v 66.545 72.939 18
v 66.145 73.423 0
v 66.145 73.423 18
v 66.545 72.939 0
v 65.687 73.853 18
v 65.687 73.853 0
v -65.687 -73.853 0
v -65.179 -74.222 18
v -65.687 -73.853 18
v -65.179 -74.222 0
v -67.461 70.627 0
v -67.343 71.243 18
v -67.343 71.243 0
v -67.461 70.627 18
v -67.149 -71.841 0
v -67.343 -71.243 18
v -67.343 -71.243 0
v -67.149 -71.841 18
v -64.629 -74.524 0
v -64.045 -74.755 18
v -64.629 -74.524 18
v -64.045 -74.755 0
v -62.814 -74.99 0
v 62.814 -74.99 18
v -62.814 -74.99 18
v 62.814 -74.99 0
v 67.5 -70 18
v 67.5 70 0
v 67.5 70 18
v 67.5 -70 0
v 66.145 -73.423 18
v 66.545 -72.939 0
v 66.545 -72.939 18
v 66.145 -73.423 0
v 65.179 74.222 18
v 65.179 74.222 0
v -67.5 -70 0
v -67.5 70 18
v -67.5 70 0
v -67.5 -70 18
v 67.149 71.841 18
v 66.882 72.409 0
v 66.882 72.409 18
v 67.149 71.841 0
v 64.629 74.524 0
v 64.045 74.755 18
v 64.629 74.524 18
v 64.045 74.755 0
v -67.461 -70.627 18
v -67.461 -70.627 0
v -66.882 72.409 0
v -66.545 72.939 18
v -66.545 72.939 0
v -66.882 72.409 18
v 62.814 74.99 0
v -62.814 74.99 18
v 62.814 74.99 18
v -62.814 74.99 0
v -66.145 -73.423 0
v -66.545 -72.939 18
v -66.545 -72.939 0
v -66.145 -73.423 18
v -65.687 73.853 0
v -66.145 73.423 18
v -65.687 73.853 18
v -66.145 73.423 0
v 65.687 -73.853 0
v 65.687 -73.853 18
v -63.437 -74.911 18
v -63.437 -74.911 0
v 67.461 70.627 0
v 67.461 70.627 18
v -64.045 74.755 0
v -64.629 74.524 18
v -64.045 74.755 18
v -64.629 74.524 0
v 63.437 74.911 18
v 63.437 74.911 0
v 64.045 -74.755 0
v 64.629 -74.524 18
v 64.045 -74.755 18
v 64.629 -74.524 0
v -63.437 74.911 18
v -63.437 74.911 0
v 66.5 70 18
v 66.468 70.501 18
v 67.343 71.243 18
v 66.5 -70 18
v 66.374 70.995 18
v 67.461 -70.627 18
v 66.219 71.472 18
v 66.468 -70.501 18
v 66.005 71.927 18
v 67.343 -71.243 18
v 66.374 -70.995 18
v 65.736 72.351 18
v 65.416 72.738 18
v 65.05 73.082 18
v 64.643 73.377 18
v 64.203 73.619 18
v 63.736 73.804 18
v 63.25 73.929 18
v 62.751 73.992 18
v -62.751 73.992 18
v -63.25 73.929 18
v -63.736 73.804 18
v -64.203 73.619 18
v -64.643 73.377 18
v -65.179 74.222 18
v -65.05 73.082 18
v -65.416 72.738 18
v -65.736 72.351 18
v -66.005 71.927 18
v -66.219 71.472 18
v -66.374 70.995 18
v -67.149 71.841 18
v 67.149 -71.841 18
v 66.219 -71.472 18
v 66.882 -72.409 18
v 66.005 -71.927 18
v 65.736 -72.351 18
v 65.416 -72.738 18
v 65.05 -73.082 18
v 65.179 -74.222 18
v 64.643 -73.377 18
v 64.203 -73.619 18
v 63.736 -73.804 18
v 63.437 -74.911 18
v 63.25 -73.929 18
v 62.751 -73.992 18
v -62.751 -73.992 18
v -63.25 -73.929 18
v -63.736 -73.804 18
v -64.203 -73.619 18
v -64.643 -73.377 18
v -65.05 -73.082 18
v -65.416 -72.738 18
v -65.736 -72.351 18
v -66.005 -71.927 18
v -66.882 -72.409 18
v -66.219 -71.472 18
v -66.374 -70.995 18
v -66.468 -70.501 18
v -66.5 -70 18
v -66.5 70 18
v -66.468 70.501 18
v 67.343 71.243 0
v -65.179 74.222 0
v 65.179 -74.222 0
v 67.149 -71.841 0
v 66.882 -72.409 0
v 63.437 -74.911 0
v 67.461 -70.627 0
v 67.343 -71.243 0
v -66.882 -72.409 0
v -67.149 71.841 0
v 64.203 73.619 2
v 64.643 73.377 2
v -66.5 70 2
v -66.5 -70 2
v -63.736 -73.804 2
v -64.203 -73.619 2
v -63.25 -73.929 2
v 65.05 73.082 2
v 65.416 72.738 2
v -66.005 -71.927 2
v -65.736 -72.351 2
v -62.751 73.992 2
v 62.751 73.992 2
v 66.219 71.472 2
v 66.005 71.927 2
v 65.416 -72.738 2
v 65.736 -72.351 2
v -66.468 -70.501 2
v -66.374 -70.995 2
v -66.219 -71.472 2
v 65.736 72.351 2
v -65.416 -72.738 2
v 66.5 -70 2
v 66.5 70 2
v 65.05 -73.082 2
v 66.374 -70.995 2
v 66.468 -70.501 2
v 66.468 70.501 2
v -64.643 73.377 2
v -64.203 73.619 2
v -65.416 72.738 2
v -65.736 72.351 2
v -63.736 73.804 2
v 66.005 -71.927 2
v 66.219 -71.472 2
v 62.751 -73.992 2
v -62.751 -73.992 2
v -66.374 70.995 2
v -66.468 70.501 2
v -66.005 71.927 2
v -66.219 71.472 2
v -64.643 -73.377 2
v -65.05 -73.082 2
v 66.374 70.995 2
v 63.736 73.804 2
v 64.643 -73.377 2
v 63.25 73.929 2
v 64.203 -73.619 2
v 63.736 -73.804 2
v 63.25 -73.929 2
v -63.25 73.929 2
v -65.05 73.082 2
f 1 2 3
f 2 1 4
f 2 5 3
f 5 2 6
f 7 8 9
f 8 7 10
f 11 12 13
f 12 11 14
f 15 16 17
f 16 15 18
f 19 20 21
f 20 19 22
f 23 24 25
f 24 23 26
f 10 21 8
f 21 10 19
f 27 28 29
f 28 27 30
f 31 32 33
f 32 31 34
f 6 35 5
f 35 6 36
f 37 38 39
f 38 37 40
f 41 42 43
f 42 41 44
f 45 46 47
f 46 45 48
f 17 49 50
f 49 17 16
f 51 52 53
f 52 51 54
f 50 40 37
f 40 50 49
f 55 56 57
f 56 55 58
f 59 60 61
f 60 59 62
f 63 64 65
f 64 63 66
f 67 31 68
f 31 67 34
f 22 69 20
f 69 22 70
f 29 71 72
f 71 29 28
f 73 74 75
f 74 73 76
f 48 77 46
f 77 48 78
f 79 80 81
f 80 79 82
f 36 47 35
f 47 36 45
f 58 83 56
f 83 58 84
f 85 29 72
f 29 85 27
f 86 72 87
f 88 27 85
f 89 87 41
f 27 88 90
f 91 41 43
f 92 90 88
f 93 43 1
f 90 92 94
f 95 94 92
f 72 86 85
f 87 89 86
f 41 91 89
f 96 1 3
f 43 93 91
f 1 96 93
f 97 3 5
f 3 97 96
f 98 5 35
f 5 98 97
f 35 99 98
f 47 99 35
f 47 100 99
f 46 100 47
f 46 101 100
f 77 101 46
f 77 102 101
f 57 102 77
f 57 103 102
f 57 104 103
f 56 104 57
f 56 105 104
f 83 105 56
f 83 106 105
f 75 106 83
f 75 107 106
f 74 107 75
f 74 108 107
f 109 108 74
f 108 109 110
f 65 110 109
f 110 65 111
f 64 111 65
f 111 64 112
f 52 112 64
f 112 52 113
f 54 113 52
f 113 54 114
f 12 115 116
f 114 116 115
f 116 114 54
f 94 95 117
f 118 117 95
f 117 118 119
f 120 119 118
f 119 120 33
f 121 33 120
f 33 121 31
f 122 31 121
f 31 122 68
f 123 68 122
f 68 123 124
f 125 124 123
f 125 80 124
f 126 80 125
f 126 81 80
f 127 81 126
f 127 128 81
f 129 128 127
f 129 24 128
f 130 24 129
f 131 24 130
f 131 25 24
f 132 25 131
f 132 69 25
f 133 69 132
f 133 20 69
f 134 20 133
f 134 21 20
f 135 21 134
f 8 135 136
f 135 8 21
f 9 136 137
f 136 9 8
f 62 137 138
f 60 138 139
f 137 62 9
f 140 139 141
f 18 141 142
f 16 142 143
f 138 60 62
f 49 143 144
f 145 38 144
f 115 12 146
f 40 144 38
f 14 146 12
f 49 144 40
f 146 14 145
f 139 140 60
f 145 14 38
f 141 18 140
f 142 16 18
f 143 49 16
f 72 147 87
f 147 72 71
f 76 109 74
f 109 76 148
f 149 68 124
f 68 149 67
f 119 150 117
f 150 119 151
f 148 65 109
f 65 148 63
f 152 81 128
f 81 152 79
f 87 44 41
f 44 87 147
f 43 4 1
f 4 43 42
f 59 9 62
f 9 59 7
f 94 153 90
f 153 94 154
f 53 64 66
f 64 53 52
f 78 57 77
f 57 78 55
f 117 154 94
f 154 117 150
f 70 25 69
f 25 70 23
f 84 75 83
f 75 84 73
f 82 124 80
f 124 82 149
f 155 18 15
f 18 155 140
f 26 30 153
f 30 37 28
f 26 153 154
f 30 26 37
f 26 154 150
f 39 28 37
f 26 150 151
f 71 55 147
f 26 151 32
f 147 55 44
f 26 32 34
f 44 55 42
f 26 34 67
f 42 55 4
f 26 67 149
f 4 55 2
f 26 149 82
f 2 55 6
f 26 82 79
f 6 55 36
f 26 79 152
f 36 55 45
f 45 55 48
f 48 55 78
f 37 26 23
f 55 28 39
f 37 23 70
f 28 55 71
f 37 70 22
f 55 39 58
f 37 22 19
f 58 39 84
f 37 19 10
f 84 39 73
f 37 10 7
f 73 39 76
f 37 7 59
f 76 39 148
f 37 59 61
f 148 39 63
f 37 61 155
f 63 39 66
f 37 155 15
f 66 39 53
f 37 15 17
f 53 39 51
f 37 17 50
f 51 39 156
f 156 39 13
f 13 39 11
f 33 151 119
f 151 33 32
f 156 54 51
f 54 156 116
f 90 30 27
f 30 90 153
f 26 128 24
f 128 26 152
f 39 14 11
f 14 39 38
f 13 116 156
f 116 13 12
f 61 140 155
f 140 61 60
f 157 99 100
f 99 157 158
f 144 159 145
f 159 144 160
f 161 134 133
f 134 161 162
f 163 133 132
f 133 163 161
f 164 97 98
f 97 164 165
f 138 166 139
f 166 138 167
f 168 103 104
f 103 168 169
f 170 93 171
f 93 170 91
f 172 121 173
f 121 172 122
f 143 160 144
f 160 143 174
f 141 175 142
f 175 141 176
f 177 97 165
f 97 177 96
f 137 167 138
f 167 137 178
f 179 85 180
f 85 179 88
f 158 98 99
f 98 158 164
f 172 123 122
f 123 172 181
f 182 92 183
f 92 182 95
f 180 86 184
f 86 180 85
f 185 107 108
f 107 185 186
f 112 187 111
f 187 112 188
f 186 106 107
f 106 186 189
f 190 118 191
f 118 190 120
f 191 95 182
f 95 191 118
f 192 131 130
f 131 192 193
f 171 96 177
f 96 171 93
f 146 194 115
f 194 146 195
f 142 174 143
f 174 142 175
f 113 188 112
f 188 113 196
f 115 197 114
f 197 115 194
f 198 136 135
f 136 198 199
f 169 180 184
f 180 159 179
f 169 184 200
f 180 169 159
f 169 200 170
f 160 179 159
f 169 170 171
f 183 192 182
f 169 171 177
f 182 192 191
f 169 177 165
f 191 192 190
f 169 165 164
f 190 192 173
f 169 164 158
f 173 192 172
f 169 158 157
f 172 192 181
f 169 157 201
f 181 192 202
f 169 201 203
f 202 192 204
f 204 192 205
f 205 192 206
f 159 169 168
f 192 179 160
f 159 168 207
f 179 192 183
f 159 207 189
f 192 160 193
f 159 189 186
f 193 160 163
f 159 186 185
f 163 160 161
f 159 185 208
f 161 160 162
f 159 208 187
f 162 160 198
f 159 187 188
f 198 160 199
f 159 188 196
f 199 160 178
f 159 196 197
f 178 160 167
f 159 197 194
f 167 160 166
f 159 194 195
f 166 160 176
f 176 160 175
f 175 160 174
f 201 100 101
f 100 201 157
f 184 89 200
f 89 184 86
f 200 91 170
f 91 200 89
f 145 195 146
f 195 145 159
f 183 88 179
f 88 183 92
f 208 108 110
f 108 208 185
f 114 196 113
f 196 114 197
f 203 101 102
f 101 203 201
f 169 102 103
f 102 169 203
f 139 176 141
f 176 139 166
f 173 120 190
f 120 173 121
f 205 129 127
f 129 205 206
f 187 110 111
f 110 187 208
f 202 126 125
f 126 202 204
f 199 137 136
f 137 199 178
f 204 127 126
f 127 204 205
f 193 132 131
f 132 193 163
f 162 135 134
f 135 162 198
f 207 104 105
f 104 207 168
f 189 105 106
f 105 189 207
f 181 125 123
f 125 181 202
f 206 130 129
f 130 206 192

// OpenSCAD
$fn = 50;


difference() {
	union() {
		hull() {
			translate(v = [-62.5000000000, 70.0000000000, 0]) {
				cylinder(h = 18, r = 5);
			}
			translate(v = [62.5000000000, 70.0000000000, 0]) {
				cylinder(h = 18, r = 5);
			}
			translate(v = [-62.5000000000, -70.0000000000, 0]) {
				cylinder(h = 18, r = 5);
			}
			translate(v = [62.5000000000, -70.0000000000, 0]) {
				cylinder(h = 18, r = 5);
			}
		}
	}
	union() {
		translate(v = [0, 0, 2]) {
			hull() {
				translate(v = [-62.5000000000, 70.0000000000, 0]) {
					cylinder(h = 16, r = 4);
				}
				translate(v = [62.5000000000, 70.0000000000, 0]) {
					cylinder(h = 16, r = 4);
				}
				translate(v = [-62.5000000000, -70.0000000000, 0]) {
					cylinder(h = 16, r = 4);
				}
				translate(v = [62.5000000000, -70.0000000000, 0]) {
					cylinder(h = 16, r = 4);
				}
			}
		}
	}
}
